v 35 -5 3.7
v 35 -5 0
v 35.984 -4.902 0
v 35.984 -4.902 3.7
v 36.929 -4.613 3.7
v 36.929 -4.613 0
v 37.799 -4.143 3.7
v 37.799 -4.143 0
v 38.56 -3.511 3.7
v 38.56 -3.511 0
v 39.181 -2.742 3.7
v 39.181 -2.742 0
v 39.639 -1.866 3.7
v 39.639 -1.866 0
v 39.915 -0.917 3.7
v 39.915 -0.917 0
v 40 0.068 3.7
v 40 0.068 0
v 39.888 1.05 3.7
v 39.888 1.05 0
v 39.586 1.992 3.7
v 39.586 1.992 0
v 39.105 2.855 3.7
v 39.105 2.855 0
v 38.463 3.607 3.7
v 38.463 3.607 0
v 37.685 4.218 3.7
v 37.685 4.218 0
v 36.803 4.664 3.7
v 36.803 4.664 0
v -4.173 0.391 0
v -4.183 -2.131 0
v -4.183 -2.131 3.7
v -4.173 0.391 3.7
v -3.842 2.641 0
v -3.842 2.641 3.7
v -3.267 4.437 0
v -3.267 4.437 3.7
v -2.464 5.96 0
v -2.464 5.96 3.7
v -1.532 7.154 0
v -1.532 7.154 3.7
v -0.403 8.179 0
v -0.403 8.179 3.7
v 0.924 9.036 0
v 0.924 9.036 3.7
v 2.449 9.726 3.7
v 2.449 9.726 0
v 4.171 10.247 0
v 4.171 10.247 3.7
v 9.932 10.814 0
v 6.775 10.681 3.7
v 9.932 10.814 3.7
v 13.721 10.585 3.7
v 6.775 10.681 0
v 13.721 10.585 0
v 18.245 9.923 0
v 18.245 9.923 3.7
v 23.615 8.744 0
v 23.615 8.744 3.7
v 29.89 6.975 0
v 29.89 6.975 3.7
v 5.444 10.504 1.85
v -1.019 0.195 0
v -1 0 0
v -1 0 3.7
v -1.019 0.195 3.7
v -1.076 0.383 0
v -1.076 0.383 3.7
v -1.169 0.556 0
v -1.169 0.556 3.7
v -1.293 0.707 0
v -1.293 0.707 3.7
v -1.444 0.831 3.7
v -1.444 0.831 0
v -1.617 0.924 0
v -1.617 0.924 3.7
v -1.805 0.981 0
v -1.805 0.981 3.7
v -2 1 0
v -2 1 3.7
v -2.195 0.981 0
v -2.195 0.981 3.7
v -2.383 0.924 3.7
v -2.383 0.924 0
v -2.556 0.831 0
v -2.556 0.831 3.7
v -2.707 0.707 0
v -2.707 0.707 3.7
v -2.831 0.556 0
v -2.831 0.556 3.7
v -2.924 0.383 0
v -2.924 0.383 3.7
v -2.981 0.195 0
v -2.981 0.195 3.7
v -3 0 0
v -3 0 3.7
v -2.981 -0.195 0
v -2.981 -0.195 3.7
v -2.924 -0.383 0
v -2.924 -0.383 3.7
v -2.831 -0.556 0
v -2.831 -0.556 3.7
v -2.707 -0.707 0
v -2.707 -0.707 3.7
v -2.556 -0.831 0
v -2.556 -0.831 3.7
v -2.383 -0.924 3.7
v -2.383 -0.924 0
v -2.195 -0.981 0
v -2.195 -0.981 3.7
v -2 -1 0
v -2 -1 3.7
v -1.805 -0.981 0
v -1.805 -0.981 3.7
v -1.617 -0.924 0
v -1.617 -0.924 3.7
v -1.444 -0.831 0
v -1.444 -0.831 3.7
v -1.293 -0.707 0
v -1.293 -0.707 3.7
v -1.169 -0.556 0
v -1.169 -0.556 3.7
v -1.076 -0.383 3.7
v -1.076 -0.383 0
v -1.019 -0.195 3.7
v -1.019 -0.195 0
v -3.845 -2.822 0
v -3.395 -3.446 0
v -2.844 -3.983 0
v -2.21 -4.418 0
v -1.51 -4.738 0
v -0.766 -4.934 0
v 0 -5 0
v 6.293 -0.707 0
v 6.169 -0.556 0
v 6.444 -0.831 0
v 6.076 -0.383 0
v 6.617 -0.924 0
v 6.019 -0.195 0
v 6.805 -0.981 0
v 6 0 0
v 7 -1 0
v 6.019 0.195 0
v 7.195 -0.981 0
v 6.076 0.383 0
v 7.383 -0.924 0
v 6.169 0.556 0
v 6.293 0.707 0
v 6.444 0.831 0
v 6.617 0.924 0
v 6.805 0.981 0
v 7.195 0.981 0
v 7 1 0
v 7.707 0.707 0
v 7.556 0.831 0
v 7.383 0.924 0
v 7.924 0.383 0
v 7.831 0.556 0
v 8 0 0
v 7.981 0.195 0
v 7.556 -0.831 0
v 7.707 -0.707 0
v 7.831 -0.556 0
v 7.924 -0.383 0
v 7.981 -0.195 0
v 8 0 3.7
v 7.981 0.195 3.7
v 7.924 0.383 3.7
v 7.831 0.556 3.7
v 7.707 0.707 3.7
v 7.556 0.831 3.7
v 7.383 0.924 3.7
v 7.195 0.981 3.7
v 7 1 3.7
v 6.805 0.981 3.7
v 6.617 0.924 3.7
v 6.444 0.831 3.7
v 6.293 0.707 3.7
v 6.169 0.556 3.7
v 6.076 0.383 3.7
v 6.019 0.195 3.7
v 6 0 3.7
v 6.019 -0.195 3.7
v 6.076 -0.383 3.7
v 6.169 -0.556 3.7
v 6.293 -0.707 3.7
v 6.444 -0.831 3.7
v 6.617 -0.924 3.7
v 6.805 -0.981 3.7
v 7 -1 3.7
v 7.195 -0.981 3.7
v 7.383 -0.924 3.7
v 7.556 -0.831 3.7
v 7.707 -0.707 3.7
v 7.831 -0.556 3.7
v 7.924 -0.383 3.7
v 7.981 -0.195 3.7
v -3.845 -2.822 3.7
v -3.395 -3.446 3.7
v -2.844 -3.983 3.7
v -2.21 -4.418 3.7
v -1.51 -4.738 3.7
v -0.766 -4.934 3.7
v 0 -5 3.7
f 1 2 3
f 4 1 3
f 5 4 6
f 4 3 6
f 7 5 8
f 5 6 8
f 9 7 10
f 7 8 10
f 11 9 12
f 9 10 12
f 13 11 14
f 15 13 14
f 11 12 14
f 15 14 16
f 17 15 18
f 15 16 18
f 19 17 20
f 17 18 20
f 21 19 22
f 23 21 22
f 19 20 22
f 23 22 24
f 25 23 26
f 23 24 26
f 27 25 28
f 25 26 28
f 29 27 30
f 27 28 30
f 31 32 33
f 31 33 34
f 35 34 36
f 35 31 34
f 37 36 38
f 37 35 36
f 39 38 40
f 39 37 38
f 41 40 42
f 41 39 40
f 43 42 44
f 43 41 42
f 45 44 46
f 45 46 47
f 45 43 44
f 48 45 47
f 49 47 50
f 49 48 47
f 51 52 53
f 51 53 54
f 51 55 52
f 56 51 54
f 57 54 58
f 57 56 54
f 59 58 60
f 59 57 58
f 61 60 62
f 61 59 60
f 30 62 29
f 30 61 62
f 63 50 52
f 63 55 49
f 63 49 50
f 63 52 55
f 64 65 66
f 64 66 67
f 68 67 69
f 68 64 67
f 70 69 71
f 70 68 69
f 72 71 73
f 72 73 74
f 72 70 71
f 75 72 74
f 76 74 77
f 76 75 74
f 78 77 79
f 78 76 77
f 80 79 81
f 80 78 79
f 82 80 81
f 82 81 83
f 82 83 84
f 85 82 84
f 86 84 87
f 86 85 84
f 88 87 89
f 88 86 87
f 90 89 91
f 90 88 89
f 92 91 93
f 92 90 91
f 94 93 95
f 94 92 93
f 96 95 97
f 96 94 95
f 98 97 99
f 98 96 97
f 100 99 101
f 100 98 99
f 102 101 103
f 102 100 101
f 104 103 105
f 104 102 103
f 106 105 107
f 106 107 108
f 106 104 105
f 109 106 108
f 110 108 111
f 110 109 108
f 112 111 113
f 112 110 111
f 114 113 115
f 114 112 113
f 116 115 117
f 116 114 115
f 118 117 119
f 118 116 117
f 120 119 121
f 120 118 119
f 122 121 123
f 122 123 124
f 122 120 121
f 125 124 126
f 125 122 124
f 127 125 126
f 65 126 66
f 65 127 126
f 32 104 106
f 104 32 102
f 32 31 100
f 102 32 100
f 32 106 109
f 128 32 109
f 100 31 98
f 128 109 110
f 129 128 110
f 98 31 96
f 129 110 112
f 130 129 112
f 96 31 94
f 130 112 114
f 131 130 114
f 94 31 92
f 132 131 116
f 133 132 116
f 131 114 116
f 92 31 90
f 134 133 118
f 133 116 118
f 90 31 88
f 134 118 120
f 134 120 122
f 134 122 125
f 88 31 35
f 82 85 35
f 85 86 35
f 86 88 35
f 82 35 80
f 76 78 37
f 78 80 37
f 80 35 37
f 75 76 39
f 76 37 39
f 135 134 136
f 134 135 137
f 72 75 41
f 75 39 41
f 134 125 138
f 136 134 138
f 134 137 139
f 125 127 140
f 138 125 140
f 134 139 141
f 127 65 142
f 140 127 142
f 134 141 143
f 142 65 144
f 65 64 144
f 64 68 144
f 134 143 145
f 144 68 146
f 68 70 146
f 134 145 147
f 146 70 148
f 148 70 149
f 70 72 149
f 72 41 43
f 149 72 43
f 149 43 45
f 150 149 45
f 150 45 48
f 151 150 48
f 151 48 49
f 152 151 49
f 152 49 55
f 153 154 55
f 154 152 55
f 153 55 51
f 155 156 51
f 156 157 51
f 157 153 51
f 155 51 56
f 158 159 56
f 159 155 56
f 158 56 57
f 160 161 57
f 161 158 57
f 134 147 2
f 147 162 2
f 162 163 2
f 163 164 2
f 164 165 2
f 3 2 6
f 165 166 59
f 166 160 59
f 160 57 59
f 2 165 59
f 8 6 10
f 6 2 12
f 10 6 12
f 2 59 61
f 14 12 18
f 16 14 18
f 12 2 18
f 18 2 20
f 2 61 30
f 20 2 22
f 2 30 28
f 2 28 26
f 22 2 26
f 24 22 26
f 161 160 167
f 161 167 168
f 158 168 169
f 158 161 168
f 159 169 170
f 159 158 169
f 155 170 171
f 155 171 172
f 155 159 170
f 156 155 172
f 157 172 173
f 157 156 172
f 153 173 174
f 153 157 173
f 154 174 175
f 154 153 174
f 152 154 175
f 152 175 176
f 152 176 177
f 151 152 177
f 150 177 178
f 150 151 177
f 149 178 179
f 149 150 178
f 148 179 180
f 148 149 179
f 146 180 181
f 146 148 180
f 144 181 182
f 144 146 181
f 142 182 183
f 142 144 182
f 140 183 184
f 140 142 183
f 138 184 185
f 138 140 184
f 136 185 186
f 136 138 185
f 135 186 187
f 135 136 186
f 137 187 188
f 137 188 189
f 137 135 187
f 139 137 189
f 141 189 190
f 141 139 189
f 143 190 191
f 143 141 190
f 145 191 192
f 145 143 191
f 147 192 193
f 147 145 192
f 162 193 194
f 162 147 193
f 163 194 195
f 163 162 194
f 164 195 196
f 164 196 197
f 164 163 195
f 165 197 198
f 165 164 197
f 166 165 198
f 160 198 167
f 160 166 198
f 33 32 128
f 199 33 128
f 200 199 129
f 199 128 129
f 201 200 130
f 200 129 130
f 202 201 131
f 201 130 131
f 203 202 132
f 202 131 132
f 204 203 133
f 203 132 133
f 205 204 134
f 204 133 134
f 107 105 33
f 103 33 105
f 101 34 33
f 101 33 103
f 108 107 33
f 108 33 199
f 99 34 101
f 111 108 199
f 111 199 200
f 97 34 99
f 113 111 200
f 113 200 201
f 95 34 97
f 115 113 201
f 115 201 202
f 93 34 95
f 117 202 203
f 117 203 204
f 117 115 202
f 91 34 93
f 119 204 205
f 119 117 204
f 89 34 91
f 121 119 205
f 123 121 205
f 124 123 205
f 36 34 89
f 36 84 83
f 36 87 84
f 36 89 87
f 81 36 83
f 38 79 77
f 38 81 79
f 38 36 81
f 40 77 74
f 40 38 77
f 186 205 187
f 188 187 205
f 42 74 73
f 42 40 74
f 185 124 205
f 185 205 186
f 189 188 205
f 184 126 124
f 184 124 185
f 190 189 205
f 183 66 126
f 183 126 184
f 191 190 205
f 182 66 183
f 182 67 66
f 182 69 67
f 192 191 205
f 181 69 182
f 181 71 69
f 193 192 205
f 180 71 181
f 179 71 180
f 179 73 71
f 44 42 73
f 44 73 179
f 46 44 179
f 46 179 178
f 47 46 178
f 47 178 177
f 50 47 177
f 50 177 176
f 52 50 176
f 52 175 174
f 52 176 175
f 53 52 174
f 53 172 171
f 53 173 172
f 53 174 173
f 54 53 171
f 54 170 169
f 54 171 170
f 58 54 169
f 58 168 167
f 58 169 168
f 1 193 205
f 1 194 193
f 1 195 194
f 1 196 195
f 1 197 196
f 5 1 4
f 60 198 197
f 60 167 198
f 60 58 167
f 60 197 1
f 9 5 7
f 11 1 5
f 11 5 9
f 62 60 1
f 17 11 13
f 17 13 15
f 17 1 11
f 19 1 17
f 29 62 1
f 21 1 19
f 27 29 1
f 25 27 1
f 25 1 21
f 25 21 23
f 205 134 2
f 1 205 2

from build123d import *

# Parameters (mm, degrees)
SKETCH1_R           = 1
BOSS_EXTRUDE1_DEPTH = 3.7


with BuildPart() as part:
    # Sketch1 → Boss-Extrude1 (new body)
    with BuildSketch(Plane.XY):
        with BuildLine():
            Line((0, -5), (35, -5))
            ThreePointArc((35, -5), (39.915195567, -0.91698012), (36.802854648, 4.663658984))
            add(Edge.make_bspline(
                [(-4.182897753, -2.131172107), (-5.422528099, 19.74118681), (36.802854648, 4.663658984)],
                knots=[0, 0, 0, 1, 1, 1], degree=2))
            ThreePointArc((-4.182897753, -2.131172107), (-2.536080001, -4.213880968), (0, -5))
        make_face()
        with Locations((-2, 0)):
            Circle(SKETCH1_R, mode=Mode.SUBTRACT)
        with Locations((7, 0)):
            Circle(SKETCH1_R, mode=Mode.SUBTRACT)
    extrude(amount=BOSS_EXTRUDE1_DEPTH)


solid = part.part
